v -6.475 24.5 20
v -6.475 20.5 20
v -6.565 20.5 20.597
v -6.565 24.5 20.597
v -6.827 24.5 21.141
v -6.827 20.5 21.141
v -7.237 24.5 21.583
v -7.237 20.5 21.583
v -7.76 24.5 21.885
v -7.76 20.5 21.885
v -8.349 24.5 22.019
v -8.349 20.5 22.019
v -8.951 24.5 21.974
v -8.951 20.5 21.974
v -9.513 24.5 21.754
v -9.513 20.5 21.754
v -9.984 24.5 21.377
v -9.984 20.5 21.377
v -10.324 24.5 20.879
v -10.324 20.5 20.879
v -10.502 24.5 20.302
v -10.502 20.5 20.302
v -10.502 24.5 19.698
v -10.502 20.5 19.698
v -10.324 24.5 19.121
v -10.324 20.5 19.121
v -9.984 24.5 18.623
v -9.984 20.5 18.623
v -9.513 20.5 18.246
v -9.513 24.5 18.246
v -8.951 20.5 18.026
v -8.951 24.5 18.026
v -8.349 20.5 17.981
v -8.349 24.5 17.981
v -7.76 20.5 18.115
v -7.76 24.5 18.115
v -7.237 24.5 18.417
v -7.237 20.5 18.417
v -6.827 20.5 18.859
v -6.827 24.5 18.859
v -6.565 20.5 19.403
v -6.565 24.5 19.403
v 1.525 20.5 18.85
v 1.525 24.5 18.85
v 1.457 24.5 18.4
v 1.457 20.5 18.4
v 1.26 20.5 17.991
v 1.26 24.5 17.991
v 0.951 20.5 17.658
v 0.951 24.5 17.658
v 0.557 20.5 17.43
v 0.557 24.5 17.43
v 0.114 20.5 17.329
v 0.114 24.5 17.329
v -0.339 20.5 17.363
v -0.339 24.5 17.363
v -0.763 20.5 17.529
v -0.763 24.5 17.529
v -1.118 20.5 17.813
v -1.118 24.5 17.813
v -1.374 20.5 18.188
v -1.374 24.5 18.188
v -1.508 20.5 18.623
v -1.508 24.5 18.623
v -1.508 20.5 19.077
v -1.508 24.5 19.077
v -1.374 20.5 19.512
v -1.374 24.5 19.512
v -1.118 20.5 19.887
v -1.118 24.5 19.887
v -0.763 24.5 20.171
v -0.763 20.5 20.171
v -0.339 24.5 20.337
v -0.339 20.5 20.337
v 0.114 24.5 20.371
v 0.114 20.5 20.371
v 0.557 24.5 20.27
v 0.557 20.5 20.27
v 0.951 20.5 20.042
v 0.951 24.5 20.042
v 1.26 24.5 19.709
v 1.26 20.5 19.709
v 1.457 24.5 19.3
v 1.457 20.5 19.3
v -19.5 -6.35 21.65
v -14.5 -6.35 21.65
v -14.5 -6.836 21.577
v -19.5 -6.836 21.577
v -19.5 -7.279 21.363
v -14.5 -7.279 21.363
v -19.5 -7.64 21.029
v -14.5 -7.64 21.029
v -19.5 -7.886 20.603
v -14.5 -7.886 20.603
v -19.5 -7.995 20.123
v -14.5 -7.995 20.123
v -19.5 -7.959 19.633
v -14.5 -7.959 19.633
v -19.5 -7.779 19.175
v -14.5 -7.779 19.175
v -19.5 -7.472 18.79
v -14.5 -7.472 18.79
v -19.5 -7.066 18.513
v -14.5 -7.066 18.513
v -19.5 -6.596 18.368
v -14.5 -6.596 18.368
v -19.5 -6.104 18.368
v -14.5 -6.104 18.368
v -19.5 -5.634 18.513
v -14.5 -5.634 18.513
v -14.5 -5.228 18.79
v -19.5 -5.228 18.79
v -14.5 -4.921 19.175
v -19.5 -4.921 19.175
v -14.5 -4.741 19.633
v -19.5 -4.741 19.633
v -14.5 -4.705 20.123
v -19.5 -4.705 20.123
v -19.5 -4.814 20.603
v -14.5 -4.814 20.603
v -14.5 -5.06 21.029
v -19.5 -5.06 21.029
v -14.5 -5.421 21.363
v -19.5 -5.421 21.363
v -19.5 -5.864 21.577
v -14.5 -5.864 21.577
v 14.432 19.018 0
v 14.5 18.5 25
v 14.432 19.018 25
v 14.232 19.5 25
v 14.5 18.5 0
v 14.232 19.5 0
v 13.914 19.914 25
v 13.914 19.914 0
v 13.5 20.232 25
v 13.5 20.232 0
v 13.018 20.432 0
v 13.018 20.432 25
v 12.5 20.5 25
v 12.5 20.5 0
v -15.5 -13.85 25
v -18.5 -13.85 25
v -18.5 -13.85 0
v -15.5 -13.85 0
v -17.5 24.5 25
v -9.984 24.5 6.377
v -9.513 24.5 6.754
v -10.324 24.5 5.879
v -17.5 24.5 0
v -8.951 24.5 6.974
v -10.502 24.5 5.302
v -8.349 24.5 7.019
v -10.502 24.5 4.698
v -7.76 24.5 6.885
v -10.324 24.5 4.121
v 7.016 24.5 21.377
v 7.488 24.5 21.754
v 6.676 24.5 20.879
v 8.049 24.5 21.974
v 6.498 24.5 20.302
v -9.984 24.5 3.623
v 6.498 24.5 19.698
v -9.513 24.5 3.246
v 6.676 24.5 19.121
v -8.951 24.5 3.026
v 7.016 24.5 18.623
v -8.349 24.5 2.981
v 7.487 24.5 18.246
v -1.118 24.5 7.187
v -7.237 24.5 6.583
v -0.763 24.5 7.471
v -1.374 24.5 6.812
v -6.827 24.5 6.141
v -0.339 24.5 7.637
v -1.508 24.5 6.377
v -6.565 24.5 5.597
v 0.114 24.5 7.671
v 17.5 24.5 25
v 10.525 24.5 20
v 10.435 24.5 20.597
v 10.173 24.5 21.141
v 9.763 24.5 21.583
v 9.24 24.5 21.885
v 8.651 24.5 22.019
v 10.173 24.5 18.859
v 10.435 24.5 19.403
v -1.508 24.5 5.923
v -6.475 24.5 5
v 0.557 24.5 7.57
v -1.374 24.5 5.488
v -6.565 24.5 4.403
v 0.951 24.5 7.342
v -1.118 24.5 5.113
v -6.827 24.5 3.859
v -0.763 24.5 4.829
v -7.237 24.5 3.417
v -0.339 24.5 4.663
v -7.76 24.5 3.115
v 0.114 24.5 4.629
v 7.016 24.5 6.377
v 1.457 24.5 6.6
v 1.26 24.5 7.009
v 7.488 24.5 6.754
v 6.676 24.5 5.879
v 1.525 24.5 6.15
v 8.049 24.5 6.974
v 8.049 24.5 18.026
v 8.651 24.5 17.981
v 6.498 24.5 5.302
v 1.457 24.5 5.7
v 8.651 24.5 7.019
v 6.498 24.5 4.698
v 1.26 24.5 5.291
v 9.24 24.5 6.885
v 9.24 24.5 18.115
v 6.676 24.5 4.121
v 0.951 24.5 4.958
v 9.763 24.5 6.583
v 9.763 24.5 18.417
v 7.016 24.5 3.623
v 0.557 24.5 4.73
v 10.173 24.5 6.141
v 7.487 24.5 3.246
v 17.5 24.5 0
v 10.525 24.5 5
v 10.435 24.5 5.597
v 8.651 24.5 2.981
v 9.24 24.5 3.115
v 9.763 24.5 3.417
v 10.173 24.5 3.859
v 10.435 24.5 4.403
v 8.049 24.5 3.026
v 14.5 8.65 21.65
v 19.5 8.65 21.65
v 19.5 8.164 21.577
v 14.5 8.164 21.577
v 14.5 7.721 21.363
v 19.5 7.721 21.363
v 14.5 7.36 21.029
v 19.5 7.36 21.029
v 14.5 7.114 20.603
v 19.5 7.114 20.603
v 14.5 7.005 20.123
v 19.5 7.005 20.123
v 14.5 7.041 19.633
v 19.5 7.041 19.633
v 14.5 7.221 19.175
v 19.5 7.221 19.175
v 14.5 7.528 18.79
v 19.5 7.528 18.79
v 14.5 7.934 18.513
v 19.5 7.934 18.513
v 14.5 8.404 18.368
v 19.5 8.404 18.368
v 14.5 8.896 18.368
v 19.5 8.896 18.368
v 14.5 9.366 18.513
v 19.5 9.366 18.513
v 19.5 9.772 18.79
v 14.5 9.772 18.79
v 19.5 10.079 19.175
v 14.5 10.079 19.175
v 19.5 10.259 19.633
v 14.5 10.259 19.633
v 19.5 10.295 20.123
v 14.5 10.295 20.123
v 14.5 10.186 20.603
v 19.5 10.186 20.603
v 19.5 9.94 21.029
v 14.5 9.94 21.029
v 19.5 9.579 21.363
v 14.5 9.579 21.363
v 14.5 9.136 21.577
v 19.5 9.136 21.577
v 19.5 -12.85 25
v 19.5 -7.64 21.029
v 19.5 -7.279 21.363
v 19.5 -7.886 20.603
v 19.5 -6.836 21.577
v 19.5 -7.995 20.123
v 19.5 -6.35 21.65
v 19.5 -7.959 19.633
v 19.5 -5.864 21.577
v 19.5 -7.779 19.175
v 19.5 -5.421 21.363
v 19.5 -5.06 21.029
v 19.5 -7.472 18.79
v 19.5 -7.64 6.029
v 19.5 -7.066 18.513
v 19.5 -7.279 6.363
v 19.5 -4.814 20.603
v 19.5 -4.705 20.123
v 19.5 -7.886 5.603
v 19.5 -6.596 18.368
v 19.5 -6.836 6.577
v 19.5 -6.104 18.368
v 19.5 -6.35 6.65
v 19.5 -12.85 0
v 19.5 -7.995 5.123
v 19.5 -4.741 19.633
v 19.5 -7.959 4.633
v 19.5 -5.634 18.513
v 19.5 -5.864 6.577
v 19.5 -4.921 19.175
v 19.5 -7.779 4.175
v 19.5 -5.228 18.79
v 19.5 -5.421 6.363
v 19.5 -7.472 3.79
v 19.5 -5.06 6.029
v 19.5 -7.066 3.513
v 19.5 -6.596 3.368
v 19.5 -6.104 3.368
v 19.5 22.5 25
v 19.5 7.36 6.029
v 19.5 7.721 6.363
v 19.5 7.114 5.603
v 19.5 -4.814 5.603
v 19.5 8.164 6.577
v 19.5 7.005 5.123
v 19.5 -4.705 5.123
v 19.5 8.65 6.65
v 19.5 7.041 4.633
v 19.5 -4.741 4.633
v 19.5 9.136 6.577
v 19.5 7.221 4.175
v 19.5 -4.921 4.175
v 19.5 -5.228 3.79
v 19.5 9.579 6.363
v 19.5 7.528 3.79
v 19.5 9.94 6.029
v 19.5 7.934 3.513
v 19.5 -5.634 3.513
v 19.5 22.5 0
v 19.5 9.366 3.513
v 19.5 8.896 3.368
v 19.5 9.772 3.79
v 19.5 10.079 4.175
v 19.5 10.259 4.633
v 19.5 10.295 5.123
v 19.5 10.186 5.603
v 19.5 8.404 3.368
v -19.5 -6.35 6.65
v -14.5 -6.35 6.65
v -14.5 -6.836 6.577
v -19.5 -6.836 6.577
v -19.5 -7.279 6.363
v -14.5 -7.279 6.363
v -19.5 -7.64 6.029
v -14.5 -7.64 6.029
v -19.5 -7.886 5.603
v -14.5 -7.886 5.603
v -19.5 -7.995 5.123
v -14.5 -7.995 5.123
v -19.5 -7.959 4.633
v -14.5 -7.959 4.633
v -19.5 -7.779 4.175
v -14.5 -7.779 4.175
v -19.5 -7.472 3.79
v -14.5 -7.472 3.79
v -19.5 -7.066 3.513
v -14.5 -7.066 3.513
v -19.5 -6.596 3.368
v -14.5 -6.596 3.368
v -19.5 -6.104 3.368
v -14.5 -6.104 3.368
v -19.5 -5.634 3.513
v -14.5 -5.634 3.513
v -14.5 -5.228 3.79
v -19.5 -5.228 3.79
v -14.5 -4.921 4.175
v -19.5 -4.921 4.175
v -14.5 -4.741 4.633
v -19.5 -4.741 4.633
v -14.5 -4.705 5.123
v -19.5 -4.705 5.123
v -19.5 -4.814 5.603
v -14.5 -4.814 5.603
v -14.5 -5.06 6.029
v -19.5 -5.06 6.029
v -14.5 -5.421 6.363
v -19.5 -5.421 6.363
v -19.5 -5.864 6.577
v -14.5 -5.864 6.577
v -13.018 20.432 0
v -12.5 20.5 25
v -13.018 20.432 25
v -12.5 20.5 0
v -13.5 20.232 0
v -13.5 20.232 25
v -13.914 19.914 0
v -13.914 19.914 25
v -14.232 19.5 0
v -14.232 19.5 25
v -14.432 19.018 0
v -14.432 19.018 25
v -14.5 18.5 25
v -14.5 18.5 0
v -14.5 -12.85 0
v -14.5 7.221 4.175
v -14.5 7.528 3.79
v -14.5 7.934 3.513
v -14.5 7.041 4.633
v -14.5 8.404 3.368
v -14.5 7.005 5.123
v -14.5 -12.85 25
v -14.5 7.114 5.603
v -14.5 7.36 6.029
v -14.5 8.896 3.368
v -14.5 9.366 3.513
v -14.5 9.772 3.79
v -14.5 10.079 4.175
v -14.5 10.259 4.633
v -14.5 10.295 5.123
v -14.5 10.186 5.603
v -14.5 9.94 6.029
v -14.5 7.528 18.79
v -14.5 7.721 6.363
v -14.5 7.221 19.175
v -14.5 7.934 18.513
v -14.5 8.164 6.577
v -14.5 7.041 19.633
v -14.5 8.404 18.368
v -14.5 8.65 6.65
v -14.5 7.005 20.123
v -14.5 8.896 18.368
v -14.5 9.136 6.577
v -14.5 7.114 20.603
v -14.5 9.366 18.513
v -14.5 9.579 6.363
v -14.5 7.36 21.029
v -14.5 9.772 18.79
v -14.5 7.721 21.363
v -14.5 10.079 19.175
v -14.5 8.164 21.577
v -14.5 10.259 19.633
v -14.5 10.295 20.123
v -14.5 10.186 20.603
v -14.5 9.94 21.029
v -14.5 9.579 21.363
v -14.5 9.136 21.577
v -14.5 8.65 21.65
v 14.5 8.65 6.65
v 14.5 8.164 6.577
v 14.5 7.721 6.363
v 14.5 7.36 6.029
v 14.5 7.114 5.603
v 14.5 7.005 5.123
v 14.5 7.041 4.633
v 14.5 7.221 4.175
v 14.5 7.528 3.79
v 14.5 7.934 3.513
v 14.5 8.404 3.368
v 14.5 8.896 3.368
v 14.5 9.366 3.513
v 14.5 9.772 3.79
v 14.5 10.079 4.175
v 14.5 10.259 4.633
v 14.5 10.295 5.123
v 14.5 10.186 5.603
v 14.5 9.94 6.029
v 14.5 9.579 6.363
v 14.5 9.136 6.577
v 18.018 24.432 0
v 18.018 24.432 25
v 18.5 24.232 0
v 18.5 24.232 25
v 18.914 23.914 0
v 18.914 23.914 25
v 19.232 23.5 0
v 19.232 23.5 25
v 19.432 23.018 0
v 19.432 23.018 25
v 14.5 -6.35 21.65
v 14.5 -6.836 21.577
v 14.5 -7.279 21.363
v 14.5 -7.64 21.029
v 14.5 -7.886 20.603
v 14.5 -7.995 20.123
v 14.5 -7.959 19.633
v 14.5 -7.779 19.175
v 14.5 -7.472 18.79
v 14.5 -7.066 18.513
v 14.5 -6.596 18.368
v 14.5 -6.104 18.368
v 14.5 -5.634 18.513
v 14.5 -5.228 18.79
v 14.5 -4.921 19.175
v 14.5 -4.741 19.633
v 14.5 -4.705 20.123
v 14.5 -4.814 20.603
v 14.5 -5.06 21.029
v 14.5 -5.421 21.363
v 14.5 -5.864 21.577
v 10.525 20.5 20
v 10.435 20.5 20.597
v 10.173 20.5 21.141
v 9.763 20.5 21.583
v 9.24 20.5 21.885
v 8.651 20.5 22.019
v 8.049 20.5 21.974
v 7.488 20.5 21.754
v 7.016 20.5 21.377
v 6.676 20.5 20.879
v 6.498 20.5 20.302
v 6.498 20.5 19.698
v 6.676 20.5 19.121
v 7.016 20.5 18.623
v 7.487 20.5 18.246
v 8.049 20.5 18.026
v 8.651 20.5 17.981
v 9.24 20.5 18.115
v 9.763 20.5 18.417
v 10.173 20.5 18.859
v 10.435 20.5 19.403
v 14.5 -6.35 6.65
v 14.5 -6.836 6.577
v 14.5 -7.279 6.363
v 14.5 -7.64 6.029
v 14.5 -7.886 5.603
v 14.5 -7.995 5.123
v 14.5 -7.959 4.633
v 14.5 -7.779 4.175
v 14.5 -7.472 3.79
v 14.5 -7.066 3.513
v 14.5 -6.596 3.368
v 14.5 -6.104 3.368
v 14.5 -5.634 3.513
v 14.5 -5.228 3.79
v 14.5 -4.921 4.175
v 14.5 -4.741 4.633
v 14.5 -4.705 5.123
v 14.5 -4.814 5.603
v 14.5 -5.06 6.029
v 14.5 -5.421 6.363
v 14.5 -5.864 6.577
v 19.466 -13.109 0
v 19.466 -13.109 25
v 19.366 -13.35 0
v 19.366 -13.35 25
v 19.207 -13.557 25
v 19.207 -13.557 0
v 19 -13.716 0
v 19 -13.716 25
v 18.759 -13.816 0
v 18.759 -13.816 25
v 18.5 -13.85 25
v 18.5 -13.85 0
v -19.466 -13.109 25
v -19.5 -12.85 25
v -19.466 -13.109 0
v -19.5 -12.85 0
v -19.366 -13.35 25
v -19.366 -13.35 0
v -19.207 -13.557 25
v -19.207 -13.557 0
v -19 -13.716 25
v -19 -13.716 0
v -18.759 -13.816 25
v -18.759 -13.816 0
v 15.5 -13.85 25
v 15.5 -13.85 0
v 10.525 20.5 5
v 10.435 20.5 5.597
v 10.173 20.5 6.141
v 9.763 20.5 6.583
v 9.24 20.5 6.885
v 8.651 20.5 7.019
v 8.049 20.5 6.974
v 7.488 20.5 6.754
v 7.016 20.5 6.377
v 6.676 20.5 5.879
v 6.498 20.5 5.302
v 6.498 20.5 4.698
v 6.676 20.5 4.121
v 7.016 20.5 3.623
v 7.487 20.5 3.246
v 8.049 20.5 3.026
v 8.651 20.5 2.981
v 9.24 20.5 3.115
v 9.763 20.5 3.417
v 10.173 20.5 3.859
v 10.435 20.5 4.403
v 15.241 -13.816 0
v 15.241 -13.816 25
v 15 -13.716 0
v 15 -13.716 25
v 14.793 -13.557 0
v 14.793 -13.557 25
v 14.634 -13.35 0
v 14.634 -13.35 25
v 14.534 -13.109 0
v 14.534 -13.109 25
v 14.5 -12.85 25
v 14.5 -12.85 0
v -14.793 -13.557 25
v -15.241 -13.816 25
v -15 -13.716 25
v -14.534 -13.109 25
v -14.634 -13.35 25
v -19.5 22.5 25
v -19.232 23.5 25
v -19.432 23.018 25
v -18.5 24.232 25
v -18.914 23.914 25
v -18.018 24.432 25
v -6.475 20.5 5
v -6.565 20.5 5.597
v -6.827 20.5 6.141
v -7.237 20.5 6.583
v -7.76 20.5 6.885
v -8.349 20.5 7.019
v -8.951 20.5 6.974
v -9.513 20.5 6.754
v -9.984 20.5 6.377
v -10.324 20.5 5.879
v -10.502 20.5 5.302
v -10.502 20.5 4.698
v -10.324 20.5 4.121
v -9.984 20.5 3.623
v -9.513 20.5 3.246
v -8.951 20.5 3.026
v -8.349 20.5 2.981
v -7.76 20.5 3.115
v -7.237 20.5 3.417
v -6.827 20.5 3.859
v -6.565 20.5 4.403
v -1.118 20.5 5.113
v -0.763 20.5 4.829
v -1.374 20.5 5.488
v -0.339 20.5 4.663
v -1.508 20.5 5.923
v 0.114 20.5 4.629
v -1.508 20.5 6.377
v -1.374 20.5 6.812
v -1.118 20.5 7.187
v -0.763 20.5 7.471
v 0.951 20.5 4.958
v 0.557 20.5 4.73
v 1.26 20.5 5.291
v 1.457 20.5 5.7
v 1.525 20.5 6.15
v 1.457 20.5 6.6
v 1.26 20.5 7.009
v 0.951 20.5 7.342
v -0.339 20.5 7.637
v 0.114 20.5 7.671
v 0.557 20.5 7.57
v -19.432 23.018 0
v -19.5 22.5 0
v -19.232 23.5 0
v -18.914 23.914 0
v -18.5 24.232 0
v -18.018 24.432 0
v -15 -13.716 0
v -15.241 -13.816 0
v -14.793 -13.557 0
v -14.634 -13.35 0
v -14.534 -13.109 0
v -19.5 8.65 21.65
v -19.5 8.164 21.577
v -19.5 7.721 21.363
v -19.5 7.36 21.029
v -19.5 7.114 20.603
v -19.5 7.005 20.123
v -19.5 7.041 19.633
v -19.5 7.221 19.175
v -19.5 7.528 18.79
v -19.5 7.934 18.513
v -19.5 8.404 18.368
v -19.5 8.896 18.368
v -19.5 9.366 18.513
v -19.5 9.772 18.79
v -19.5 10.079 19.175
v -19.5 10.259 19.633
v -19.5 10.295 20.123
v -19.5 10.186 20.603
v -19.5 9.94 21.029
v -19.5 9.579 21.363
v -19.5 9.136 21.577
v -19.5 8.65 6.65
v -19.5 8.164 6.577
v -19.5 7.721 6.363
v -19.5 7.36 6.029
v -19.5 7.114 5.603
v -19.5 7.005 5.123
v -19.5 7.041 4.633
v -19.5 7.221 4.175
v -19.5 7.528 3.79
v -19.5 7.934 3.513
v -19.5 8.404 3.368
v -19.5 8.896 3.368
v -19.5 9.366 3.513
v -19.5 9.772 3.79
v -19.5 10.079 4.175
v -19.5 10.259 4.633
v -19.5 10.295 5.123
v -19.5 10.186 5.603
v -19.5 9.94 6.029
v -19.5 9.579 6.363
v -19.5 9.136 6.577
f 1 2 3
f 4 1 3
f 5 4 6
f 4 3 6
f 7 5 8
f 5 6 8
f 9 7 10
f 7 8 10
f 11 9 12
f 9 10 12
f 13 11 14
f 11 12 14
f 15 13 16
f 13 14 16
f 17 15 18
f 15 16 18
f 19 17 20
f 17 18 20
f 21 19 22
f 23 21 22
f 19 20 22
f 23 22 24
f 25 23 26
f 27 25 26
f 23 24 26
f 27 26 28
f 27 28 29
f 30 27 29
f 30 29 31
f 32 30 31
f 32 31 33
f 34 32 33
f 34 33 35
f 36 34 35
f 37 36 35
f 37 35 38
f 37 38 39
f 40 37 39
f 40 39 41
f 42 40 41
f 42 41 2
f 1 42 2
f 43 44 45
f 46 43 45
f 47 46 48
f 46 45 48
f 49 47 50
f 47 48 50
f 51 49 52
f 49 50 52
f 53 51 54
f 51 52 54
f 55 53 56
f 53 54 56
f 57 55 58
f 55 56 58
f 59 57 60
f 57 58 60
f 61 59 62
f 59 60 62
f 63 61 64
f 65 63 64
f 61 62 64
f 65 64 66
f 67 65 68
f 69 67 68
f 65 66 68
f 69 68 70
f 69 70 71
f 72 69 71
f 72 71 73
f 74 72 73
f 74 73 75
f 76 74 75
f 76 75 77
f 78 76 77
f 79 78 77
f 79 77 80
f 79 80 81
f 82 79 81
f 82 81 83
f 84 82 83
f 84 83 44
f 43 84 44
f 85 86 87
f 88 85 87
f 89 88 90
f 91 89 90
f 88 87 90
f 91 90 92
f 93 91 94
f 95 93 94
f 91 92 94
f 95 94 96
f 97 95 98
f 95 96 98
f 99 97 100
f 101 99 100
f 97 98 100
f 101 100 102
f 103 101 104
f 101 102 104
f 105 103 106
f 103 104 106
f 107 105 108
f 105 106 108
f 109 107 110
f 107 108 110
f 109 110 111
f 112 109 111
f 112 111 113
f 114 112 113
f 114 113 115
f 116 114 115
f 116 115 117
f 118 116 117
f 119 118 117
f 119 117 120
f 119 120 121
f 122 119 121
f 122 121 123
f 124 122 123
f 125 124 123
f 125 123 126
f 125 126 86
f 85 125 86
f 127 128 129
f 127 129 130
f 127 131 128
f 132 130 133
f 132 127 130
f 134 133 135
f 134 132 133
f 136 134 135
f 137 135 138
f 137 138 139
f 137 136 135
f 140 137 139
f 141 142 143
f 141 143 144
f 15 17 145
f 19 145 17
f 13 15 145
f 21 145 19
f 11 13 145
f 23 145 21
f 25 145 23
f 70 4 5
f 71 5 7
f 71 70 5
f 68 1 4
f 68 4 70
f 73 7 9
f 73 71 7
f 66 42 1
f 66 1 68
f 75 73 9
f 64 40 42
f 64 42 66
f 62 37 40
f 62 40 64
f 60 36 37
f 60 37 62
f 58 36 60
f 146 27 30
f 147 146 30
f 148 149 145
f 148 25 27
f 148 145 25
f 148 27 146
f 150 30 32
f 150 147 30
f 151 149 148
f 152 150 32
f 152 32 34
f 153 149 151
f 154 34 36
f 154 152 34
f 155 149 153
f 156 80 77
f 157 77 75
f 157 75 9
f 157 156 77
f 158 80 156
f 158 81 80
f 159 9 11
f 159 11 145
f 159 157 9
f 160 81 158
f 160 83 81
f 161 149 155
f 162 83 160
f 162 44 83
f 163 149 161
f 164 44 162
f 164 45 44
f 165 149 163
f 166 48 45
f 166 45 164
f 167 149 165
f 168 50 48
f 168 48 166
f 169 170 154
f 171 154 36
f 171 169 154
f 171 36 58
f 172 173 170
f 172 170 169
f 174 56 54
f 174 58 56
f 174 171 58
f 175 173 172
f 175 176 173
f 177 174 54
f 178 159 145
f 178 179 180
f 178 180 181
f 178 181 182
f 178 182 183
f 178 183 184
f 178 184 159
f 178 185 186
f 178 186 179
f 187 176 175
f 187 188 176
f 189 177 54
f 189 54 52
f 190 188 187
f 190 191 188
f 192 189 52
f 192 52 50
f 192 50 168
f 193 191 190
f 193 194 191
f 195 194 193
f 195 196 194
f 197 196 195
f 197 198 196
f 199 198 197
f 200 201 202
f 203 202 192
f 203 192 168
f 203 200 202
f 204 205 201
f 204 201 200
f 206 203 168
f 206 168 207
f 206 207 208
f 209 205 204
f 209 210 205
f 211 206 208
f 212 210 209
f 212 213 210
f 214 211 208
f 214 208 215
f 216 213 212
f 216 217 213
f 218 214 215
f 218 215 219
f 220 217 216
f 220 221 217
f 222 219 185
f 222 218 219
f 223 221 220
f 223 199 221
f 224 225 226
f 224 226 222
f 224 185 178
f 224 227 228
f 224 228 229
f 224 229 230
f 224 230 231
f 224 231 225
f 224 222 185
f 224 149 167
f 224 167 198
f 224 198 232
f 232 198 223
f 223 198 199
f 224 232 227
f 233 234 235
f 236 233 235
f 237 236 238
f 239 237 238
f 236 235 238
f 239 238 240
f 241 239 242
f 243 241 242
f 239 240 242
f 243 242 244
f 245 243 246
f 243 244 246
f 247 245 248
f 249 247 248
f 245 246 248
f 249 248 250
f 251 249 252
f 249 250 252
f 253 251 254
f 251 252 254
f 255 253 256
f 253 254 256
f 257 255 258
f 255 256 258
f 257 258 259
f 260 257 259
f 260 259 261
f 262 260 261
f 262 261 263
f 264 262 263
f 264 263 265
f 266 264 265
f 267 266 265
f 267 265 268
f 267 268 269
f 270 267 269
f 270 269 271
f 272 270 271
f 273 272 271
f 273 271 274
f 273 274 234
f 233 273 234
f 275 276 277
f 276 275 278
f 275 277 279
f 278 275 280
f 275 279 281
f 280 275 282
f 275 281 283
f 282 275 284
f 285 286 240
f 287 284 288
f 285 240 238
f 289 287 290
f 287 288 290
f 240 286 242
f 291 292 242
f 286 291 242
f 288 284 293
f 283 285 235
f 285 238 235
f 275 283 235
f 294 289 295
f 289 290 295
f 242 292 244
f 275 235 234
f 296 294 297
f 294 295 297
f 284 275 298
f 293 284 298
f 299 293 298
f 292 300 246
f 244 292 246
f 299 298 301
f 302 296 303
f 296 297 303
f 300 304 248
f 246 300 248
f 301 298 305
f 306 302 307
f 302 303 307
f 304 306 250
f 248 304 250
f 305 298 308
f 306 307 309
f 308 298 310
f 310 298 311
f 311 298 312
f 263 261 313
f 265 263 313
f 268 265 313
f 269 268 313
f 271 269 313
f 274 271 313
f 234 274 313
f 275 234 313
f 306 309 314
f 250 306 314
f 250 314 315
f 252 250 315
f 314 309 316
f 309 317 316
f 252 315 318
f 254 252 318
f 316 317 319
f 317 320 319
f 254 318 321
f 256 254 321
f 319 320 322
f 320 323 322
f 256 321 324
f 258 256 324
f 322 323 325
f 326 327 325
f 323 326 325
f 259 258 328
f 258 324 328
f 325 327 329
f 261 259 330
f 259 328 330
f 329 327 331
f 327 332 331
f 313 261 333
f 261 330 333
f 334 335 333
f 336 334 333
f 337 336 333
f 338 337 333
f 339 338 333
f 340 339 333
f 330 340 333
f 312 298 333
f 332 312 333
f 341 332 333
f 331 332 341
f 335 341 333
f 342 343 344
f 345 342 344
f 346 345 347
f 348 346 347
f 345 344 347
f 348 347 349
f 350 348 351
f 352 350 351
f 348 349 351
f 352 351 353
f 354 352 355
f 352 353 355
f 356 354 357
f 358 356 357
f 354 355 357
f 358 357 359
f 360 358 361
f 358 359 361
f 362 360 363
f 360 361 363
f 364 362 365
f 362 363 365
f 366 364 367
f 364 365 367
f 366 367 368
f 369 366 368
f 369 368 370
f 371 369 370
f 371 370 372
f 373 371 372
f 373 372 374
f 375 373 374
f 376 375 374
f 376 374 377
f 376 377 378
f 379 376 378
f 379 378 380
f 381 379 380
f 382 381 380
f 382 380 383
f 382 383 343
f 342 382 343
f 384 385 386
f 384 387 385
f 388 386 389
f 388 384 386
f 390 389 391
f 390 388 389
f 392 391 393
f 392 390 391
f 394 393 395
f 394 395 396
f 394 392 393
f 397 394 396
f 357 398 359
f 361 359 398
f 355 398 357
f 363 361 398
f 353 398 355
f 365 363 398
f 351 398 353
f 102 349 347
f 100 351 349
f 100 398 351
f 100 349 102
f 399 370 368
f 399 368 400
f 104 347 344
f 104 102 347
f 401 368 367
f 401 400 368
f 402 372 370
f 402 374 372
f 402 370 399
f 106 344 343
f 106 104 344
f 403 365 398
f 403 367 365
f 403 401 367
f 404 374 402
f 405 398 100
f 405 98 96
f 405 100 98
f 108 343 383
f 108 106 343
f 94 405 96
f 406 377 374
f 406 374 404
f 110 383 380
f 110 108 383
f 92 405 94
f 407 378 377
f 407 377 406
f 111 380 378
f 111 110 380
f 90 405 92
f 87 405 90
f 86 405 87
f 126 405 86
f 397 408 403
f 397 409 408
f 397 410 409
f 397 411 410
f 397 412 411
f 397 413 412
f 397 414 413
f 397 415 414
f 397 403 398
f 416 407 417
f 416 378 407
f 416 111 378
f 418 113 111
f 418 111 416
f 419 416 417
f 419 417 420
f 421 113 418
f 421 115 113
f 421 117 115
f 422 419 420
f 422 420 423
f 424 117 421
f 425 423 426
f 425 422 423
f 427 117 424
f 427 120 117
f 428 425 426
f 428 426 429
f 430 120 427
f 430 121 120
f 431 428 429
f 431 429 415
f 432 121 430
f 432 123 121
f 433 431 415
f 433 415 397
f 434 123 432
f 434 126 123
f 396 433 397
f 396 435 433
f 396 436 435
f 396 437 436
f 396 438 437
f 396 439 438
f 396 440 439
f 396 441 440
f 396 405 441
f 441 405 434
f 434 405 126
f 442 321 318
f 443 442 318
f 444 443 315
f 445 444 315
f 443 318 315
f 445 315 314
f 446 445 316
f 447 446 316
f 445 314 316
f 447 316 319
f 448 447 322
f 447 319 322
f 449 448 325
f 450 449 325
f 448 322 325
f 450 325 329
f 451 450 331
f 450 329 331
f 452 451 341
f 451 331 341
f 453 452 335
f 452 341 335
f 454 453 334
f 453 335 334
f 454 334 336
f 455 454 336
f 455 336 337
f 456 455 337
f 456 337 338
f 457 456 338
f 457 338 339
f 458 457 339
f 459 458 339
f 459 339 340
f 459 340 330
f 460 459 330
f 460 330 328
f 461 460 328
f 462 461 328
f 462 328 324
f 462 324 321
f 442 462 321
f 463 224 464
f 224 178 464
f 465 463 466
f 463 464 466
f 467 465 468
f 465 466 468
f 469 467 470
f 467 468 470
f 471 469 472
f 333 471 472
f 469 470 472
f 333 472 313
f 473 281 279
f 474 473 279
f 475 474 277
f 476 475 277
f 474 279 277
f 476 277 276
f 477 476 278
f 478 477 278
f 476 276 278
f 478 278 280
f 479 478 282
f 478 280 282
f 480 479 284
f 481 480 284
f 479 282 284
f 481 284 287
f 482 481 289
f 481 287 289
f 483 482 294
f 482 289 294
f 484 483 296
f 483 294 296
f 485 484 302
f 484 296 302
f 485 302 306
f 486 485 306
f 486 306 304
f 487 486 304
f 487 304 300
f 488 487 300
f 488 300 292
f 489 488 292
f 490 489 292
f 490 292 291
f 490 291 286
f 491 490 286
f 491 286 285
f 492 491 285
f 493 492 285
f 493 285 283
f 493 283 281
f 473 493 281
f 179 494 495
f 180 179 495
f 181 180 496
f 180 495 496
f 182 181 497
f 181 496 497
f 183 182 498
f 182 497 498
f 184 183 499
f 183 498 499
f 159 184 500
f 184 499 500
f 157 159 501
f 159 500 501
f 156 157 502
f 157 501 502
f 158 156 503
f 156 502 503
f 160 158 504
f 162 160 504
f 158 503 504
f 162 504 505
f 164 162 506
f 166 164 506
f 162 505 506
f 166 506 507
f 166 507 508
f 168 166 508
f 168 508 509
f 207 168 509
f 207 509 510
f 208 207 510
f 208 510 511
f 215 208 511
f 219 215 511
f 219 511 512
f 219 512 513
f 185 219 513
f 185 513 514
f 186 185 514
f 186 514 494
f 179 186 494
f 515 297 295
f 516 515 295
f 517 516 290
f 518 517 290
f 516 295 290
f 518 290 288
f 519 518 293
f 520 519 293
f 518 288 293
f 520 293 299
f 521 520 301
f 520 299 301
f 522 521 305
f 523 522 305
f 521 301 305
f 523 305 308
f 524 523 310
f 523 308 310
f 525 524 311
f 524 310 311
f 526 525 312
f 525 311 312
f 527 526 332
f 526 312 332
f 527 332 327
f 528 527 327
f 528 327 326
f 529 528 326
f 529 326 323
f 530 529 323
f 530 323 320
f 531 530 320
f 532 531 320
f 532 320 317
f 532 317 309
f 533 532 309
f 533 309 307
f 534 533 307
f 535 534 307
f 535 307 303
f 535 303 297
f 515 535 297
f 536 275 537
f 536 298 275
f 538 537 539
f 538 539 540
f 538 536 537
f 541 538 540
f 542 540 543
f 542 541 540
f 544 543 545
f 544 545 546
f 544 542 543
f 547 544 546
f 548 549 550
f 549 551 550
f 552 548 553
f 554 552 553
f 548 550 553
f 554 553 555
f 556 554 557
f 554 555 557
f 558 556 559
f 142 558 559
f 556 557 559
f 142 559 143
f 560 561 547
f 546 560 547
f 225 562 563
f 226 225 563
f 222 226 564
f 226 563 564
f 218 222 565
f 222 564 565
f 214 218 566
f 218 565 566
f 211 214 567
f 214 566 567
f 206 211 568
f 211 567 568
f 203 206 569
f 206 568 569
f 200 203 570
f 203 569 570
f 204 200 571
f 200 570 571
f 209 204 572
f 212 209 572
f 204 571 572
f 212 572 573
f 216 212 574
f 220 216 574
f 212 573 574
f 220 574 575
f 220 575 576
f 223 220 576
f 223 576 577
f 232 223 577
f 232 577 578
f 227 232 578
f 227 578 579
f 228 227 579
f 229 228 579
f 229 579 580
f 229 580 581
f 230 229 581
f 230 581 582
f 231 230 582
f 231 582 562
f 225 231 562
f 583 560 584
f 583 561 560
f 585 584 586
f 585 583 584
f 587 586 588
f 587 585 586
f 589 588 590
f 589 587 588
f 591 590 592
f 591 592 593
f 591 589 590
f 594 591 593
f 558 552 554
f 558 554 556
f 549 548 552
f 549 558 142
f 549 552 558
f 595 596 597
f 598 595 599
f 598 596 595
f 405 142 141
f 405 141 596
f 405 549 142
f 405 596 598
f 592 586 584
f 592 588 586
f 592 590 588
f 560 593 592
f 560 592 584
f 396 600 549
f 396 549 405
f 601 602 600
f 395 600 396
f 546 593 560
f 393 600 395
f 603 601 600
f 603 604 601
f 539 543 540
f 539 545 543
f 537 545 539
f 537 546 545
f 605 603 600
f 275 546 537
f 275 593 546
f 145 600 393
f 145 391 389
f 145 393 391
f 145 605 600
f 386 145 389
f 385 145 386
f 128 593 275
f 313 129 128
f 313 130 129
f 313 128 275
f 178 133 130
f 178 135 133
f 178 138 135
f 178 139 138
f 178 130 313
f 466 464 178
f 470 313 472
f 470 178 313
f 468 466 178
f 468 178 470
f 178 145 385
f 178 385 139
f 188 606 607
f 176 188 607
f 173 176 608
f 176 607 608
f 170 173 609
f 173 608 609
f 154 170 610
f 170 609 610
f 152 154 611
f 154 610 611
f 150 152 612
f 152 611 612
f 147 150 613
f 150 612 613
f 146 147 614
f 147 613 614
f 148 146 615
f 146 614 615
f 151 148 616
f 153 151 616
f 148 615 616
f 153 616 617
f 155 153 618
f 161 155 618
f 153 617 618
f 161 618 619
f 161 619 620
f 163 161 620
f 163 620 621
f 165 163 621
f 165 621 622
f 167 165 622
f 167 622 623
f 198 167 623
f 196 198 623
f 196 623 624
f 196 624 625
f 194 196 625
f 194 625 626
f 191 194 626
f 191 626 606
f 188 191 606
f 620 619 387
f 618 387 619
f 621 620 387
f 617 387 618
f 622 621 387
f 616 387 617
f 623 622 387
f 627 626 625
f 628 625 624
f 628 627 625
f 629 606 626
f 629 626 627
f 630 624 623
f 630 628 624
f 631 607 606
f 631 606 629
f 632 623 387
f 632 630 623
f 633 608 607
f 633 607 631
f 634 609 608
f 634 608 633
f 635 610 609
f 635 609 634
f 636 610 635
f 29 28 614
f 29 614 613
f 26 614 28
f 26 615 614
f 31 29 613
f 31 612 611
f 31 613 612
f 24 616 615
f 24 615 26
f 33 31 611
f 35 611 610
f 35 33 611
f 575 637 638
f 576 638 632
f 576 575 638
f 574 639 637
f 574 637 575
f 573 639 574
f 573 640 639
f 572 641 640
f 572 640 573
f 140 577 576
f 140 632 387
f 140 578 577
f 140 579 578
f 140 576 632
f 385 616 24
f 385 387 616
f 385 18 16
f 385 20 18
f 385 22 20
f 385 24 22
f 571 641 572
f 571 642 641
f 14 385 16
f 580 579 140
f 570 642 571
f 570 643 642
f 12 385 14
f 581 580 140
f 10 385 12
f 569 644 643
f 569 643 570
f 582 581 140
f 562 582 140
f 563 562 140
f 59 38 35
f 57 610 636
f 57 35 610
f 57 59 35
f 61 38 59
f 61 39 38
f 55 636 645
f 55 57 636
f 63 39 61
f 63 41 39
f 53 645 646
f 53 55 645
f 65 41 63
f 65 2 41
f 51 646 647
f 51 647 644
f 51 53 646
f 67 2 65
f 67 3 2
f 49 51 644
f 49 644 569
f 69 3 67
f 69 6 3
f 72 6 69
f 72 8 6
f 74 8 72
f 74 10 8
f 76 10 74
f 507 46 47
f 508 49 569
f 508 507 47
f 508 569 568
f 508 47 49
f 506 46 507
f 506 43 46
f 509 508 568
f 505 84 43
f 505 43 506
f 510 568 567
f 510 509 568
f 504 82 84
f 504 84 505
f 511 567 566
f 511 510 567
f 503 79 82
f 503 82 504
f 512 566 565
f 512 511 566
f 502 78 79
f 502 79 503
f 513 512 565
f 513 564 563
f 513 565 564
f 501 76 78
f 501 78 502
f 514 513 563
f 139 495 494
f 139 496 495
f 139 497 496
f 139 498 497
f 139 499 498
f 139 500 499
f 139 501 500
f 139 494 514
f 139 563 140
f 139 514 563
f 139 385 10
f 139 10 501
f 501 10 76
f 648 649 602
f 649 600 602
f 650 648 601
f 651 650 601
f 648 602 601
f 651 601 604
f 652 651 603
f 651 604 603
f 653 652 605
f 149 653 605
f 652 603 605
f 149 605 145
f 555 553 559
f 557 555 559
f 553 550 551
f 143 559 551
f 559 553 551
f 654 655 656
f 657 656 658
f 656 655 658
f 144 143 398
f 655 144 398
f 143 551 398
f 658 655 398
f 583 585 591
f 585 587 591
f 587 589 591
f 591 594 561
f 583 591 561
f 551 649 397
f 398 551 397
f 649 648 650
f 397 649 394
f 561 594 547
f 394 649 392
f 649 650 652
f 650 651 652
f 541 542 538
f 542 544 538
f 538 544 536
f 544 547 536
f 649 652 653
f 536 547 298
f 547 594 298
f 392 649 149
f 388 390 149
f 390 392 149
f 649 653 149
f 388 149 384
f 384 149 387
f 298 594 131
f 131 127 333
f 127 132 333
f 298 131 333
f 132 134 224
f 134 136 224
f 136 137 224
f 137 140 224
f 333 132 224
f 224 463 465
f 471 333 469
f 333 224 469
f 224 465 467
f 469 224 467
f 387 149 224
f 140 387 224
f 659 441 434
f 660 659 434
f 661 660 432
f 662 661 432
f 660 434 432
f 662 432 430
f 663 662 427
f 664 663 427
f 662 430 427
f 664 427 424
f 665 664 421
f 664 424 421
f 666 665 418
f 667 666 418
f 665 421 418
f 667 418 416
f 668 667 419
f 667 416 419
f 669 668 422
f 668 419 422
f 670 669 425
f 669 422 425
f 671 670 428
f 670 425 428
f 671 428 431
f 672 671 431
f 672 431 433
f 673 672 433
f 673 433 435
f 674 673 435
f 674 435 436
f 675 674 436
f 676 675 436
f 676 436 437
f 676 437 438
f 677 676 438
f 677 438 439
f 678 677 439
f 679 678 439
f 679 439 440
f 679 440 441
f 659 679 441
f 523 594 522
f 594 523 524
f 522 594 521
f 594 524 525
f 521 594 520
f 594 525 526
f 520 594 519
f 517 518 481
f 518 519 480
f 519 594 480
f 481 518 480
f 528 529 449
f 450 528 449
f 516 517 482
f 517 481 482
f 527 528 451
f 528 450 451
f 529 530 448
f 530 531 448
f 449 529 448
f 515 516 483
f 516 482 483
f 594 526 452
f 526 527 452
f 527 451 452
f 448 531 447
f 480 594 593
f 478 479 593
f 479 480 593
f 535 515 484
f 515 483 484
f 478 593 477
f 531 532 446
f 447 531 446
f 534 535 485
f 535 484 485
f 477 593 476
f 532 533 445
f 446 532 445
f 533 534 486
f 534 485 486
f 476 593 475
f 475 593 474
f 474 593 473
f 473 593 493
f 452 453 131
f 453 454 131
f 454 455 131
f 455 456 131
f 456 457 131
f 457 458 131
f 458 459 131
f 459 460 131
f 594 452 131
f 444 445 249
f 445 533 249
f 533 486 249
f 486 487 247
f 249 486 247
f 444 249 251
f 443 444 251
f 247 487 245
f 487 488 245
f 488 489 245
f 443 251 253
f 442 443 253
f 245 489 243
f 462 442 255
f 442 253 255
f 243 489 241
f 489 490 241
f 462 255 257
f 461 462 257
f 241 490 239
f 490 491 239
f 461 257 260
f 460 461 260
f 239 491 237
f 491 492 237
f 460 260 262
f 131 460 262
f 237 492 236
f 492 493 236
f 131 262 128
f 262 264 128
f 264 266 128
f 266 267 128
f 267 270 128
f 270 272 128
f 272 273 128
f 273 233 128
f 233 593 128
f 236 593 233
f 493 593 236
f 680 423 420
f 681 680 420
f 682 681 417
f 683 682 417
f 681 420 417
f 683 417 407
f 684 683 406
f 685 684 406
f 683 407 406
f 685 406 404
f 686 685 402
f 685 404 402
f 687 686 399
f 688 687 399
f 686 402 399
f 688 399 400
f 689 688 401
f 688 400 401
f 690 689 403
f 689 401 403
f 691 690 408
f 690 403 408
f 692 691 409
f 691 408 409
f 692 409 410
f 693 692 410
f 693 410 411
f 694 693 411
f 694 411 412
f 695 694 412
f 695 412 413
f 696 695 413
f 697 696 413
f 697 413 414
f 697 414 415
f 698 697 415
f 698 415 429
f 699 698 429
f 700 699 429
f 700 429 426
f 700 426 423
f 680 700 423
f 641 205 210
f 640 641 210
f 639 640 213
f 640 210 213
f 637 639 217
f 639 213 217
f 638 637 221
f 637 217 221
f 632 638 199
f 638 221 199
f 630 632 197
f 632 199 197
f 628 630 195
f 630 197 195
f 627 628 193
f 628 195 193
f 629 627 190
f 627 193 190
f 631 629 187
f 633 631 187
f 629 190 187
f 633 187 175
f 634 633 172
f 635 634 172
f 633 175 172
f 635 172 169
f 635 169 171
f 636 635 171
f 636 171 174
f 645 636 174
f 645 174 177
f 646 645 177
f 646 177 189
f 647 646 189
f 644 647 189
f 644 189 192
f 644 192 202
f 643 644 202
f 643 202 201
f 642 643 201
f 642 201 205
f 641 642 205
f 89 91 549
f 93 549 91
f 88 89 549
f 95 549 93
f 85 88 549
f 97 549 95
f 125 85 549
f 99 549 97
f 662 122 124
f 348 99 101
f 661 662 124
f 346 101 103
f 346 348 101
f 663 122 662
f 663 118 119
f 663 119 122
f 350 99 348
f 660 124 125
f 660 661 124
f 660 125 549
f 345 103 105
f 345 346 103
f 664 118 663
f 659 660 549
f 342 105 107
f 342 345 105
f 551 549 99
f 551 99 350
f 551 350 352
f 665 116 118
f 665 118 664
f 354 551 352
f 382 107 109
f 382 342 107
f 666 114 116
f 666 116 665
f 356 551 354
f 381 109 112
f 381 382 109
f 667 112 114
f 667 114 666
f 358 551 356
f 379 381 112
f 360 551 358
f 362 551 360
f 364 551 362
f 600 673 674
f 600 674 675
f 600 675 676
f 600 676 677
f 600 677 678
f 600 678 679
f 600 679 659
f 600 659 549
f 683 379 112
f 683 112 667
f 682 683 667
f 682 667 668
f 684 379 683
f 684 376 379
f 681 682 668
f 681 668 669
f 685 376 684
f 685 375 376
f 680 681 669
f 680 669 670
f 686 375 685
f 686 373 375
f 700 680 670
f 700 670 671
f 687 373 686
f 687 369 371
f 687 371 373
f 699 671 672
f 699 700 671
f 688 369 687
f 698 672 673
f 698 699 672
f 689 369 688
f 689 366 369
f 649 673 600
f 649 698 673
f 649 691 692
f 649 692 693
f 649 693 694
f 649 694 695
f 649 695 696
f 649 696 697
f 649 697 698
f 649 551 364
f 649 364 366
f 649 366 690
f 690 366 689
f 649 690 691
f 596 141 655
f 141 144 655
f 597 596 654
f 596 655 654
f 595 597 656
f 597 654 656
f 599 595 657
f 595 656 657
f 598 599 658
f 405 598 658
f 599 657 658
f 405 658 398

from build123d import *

# Parameters (mm, degrees)
SKETCH_1_W               = 39
SKETCH_1_H               = 49
EXTRUDE_1_DEPTH          = 25
SKETCH_3_W               = 29
SKETCH_3_H               = 45
CUT_EXTRUDE_1_DEPTH      = 25
SKETCH_5_W               = 39
SKETCH_5_H               = 5
CUT_EXTRUDE_3_DEPTH      = 1
CUT_EXTRUDE_3_DEPTH_BACK = 26
HOLE_WIZARD_M4_4_D       = 3.3
SKETCH_20_W              = 39
SKETCH_20_H              = 5.65
CUT_EXTRUDE_5_DEPTH      = 1
CUT_EXTRUDE_5_DEPTH_BACK = 26
SKETCH_7_R               = 2.025
CUT_EXTRUDE_7_DEPTH      = 10
FILLET_1_R               = 2
FILLET_2_R               = 1
SKETCH_21_R              = 1.525
CUT_EXTRUDE_8_DEPTH      = 10


with BuildPart() as part:
    # 草图1 → 凸台-拉伸1 (new body)
    with BuildSketch(Plane.XY):
        Rectangle(SKETCH_1_W, SKETCH_1_H)
    extrude(amount=EXTRUDE_1_DEPTH)

    # 草图3 → 切除-拉伸1 (cut)
    with BuildSketch(Plane.XY.offset(25)):
        with Locations((0, -2)):
            Rectangle(SKETCH_3_W, SKETCH_3_H)
    extrude(amount=-CUT_EXTRUDE_1_DEPTH, mode=Mode.SUBTRACT)

    # 草图5 → 切除-拉伸3 (cut, two sides)
    with BuildSketch(Plane.XY.offset(25)) as cut_extrude_3_sk:
        with Locations((0, -22)):
            Rectangle(SKETCH_5_W, SKETCH_5_H)
    extrude(amount=CUT_EXTRUDE_3_DEPTH, mode=Mode.SUBTRACT)
    extrude(cut_extrude_3_sk.sketch, amount=-CUT_EXTRUDE_3_DEPTH_BACK, mode=Mode.SUBTRACT)

    # M4 螺纹孔4 (through all)
    with Locations(Plane(origin=(-19.5, 8.65, 5), x_dir=(0, 0, -1), z_dir=(-1, 0, 0))):
        with Locations((0, 0), (-15, 0), (-15, 15), (0, 15)):
            Hole(HOLE_WIZARD_M4_4_D / 2)

    # 草图20 → 切除-拉伸5 (cut, two sides)
    with BuildSketch(Plane.XY.offset(25)) as cut_extrude_5_sk:
        with Locations((0, -16.675)):
            Rectangle(SKETCH_20_W, SKETCH_20_H)
    extrude(amount=CUT_EXTRUDE_5_DEPTH, mode=Mode.SUBTRACT)
    extrude(cut_extrude_5_sk.sketch, amount=-CUT_EXTRUDE_5_DEPTH_BACK, mode=Mode.SUBTRACT)

    # 草图7 → 切除-拉伸7 (cut)
    with BuildSketch(Plane.XZ.offset(-20.5)):
        with Locations((-8.5, 20)):
            Circle(SKETCH_7_R)
        with Locations((-8.5, 5)):
            Circle(SKETCH_7_R)
        with Locations((8.5, 5)):
            Circle(SKETCH_7_R)
        with Locations((8.5, 20)):
            Circle(SKETCH_7_R)
    extrude(amount=-CUT_EXTRUDE_7_DEPTH, mode=Mode.SUBTRACT)

    # 圆角1
    fillet_1_edges = [part.edges().sort_by_distance(p)[0] for p in [
        (-14.5, 20.5, 12.5),
        (14.5, 20.5, 12.5),
        (-19.5, 24.5, 12.5),
        (19.5, 24.5, 12.5),
    ]]
    fillet(fillet_1_edges, radius=FILLET_1_R)

    # 圆角2
    fillet_2_edges = [part.edges().sort_by_distance(p)[0] for p in [
        (14.5, -13.85, 12.5),
        (-14.5, -13.85, 12.5),
        (-19.5, -13.85, 12.5),
        (19.5, -13.85, 12.5),
    ]]
    fillet(fillet_2_edges, radius=FILLET_2_R)

    # 草图21 → 切除-拉伸8 (cut)
    with BuildSketch(Plane(origin=(0, 24.5, 0), x_dir=(1, 0, 0), z_dir=(0, 1, 0))):
        with Locations((0, -6.15)):
            Circle(SKETCH_21_R)
        with Locations((0, -18.85)):
            Circle(SKETCH_21_R)
    extrude(amount=-CUT_EXTRUDE_8_DEPTH, mode=Mode.SUBTRACT)


solid = part.part
